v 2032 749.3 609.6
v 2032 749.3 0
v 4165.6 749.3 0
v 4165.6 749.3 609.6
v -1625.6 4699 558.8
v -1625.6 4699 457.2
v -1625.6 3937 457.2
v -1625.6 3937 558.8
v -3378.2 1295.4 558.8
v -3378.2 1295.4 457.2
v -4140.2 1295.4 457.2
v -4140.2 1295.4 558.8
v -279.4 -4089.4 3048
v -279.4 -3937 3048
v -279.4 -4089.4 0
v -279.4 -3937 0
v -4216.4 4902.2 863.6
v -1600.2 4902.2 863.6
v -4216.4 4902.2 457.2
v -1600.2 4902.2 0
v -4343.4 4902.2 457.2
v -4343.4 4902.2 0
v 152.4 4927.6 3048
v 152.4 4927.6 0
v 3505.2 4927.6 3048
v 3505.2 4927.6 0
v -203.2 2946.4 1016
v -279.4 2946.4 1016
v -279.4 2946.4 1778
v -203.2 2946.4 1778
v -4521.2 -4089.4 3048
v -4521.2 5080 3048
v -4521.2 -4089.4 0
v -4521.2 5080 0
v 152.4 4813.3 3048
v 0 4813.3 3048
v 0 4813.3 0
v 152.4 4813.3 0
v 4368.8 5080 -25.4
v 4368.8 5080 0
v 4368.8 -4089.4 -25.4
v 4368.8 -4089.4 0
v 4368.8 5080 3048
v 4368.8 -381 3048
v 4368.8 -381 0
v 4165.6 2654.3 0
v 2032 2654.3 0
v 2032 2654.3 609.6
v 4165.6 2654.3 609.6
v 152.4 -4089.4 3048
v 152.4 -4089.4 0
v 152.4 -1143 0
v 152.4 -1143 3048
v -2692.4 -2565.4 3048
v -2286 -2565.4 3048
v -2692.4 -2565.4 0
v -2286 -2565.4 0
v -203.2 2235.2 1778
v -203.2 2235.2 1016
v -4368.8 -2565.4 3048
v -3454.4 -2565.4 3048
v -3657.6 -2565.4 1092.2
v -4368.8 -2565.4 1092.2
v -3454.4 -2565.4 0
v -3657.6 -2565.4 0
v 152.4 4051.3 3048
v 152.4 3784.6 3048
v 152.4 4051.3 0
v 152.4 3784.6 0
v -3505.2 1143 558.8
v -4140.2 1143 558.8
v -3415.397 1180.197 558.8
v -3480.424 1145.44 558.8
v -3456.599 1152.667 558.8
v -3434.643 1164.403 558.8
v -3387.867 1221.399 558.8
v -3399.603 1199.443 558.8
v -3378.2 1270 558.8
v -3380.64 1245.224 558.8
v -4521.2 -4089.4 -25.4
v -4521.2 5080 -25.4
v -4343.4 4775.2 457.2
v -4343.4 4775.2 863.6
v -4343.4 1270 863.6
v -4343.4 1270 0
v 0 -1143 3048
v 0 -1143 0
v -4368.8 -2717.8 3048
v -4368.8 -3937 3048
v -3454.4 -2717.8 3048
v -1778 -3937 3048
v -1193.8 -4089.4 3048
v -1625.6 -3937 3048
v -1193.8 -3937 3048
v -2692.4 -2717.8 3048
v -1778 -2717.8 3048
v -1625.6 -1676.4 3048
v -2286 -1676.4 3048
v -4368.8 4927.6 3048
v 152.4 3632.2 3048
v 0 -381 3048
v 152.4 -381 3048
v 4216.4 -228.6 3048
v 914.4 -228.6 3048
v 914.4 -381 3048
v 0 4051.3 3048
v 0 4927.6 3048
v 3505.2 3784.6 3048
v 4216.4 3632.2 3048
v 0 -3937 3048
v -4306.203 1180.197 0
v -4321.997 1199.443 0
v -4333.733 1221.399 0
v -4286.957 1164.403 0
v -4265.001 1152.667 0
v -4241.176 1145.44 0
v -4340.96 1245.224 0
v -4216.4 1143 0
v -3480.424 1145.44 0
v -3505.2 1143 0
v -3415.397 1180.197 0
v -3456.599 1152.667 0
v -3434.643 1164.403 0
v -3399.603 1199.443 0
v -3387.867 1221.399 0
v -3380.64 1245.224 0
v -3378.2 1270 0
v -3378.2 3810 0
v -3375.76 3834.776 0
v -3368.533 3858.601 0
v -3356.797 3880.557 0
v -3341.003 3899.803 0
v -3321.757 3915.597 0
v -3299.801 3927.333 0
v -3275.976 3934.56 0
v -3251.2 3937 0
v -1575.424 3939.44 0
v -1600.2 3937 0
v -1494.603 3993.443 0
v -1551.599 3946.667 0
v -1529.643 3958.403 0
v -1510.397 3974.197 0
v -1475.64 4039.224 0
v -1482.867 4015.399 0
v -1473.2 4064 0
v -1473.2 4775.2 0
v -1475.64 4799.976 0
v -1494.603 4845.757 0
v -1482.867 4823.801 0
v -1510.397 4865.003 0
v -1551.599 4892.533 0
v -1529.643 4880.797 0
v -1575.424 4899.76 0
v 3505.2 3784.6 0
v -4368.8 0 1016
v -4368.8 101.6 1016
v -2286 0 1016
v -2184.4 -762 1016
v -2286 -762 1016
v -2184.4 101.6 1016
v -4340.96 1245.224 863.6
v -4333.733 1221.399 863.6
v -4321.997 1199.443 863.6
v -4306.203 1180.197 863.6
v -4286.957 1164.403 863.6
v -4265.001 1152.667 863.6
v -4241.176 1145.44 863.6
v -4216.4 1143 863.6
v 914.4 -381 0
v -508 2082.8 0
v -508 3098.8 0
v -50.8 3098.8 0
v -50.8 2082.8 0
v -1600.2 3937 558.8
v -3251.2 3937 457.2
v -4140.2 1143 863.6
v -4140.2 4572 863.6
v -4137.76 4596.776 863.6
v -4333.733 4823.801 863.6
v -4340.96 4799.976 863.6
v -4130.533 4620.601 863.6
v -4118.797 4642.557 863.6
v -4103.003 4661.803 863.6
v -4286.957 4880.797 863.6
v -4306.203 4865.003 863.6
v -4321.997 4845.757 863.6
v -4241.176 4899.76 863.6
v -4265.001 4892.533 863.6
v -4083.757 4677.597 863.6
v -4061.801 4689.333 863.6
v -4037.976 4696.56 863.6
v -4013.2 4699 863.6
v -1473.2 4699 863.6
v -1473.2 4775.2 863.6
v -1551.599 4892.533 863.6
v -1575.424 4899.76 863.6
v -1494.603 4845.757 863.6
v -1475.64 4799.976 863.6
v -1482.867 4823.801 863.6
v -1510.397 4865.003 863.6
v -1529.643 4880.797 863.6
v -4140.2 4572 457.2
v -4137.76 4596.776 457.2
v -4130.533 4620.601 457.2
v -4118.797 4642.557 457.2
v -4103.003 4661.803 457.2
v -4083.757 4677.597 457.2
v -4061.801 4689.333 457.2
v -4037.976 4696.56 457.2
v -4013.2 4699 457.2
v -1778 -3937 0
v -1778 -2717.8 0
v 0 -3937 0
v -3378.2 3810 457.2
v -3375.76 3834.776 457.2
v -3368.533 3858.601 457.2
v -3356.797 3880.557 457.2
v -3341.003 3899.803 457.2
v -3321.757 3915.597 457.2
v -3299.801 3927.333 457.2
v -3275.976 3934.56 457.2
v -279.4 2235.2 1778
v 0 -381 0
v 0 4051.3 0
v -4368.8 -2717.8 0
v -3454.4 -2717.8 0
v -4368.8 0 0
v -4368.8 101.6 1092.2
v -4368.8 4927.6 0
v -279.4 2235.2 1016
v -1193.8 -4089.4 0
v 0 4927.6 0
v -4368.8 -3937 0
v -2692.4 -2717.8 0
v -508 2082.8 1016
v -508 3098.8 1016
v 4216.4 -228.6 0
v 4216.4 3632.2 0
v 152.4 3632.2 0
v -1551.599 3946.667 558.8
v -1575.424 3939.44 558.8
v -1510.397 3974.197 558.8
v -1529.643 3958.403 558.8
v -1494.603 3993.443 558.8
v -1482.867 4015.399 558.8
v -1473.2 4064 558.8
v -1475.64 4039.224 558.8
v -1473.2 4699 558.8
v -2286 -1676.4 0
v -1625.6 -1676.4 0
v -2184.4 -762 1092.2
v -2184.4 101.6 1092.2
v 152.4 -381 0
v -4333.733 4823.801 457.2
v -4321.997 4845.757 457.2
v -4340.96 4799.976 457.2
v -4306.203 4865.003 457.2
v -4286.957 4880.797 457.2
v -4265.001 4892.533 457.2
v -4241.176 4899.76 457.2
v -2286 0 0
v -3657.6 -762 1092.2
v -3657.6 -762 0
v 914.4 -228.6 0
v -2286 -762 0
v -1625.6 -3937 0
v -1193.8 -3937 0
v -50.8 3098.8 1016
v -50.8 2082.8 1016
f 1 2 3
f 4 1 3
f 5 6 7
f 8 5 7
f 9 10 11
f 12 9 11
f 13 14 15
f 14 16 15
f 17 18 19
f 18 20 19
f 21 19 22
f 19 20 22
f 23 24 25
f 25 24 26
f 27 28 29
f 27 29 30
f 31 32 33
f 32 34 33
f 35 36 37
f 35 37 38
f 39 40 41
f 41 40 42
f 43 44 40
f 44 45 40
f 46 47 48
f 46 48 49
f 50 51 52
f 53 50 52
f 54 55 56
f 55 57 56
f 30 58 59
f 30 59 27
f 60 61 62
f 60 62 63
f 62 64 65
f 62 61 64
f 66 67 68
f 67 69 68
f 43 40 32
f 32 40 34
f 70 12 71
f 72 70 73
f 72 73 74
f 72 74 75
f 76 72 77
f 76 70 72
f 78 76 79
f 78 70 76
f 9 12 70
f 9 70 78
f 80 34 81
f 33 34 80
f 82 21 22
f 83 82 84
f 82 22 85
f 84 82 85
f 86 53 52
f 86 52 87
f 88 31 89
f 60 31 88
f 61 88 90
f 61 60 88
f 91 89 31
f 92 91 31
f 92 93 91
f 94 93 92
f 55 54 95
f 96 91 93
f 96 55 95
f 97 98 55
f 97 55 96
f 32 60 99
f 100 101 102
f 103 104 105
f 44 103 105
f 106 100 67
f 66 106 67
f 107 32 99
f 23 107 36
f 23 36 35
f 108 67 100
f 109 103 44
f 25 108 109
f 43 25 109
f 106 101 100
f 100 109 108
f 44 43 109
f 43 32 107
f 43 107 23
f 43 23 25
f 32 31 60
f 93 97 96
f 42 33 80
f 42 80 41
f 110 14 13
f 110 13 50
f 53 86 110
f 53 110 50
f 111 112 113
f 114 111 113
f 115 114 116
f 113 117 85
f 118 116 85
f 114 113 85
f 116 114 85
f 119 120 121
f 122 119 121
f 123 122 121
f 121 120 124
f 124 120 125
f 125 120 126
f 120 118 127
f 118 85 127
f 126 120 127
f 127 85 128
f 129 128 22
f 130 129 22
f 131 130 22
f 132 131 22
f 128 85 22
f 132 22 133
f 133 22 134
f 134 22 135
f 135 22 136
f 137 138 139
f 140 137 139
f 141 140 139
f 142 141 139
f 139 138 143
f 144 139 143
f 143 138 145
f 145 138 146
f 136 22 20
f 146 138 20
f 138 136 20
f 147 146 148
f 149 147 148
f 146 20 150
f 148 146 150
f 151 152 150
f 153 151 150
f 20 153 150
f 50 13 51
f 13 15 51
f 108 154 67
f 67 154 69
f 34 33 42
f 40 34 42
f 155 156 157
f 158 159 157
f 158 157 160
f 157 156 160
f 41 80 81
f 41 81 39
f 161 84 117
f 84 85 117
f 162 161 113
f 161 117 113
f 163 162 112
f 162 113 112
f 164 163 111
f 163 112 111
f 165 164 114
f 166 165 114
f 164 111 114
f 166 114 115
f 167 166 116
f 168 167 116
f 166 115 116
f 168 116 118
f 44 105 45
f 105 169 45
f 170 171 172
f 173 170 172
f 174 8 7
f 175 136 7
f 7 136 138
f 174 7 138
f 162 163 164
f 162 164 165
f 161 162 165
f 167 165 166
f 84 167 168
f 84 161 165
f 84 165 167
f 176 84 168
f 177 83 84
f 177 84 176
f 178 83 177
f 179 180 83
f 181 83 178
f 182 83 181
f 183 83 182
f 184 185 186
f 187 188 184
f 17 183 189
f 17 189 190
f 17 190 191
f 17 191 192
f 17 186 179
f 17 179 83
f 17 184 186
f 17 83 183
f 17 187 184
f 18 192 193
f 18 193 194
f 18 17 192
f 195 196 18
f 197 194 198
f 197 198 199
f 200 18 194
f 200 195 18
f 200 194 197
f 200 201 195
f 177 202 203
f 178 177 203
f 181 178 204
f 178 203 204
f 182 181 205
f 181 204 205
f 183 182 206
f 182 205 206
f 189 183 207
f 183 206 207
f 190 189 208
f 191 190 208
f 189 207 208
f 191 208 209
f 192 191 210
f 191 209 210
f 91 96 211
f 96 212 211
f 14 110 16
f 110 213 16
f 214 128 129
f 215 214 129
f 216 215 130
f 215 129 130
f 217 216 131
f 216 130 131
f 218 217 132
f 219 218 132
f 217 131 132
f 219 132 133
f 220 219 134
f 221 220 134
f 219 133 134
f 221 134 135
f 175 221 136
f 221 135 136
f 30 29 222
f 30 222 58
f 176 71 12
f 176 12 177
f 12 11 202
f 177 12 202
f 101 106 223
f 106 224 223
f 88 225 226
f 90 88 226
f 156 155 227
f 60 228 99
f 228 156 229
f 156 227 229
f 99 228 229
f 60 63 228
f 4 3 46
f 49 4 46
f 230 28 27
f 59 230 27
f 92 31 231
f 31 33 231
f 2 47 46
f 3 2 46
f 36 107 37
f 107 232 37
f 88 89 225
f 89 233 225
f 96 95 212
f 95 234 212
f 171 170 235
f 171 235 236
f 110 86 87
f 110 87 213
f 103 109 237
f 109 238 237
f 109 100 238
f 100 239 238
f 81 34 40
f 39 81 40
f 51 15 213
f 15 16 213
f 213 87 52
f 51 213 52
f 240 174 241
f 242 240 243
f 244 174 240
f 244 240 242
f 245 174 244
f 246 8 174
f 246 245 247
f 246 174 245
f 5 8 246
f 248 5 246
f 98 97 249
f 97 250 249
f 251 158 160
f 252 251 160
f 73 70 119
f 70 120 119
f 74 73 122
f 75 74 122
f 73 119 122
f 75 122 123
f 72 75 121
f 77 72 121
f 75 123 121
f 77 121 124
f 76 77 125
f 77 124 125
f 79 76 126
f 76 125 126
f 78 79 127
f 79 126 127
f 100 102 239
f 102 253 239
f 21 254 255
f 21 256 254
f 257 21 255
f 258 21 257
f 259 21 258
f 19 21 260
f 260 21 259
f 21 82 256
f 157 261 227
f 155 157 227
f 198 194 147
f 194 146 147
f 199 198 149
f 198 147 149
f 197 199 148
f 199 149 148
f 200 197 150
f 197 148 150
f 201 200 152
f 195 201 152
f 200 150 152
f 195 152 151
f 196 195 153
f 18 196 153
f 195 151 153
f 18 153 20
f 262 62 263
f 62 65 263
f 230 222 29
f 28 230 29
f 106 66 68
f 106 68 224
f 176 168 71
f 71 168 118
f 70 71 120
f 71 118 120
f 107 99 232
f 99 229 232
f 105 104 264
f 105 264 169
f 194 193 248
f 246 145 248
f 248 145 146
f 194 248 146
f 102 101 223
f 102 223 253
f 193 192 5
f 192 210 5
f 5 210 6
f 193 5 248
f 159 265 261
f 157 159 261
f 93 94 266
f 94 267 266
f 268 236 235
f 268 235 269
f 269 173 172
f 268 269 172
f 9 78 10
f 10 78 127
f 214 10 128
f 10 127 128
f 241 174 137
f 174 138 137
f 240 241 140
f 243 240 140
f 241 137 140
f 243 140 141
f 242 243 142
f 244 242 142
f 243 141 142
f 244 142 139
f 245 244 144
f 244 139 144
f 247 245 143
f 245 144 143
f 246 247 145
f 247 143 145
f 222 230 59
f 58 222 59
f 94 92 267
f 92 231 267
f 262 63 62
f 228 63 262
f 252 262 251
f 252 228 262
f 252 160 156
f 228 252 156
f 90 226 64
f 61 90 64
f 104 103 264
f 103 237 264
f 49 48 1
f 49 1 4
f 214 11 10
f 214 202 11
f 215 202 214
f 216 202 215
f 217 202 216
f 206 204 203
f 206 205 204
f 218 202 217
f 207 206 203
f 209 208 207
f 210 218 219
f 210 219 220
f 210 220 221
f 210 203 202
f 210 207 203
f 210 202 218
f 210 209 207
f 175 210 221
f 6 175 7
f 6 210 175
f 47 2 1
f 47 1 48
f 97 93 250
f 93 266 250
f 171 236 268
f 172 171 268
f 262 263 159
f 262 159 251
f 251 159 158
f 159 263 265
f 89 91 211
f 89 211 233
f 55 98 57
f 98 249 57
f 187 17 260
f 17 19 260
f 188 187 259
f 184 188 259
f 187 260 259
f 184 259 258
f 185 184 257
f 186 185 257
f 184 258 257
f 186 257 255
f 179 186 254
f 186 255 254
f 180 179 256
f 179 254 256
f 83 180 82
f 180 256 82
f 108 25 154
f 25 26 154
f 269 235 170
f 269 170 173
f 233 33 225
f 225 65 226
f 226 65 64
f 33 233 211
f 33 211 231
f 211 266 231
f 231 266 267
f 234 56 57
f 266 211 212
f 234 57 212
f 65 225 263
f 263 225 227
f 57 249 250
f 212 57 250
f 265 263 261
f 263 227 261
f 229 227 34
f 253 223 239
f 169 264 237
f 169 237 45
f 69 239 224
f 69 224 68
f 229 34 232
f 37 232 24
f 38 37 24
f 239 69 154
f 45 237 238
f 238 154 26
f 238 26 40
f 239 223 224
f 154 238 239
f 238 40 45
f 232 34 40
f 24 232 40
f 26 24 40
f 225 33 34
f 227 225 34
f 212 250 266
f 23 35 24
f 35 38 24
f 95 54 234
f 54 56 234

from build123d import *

# Parameters (mm, degrees)
F1_DEPTH  = 1016
F3_DEPTH  = 76.2
F5_DEPTH  = 1955.8
F6_W      = 8890
F6_H      = 9169.4
F7_DEPTH  = 25.4
F9_DEPTH  = 457.2
F11_DEPTH = 101.6
F13_DEPTH = 304.8
F14_W     = 457.2
F14_H     = 1016
F15_DEPTH = 1016
F16_W     = 76.2
F16_H     = 711.2
F17_DEPTH = 762
F18_W     = 2133.6
F18_H     = 1905
F19_DEPTH = 609.6


with BuildPart() as f1:
    # F0 (on Top) → F1 (new body)
    with BuildSketch(Plane.XY):
        Polygon((-4368.8, 152.4), (-4368.8, 4927.6), (0, 4927.6), (0, 4813.3), (152.4, 4813.3), (152.4, 4927.6), (3505.2, 4927.6), (3505.2, 3784.6), (152.4, 3784.6), (152.4, 4051.3), (0, 4051.3), (0, 0), (0, -381), (152.4, -381), (152.4, 0), (152.4, 3632.2), (4216.4, 3632.2), (4216.4, -228.6), (914.4, -228.6), (914.4, -381), (4216.4, -381), (4368.8, -381), (4368.8, 3632.2), (4368.8, 3784.6), (4368.8, 5080), (3505.2, 5080), (152.4, 5080), (-4521.2, 5080), (-4521.2, 0), (-4521.2, -6.74503), (-4521.2, -1866.195499), (-4521.2, -4089.4), (-4368.8, -4089.4), (-1625.6, -4089.4), (-1193.8, -4089.4), (-1193.8, -3937), (-1625.6, -3937), (-1625.6, -2565.4), (-1625.6, -1676.4), (-2286, -1676.4), (-2286, -2565.4), (-2692.4, -2565.4), (-2692.4, -2717.8), (-1778, -2717.8), (-1778, -3937), (-4368.8, -3937), (-4368.8, -2717.8), (-3454.4, -2717.8), (-3454.4, -2565.4), (-3657.6, -2565.4), (-4368.8, -2565.4), (-4368.8, -762), (-4368.8, 0), align=None)
        Polygon((-3657.6, 0), (-4368.8, 0), (-4368.8, -762), (-4368.8, -2565.4), (-3657.6, -2565.4), (-3657.6, -762), (-2286, -762), (-2286, 0), (-2311.890112, 0), align=None)
        Polygon((-279.4, -4089.4), (152.4, -4089.4), (152.4, -3937), (152.4, -1143), (0, -1143), (0, -3937), (-279.4, -3937), align=None)
    extrude(amount=F1_DEPTH)

    # F2 (on face) → F3 (join)
    with BuildSketch(Plane.XY.offset(1016)):
        Polygon((-2286, -762), (-2286, 0), (-4368.8, 0), (-4368.8, 101.6), (-4368.8, 4927.6), (0, 4927.6), (0, 4813.3), (152.4, 4813.3), (152.4, 4927.6), (3505.2, 4927.6), (3505.2, 3784.6), (152.4, 3784.6), (152.4, 4051.3), (0, 4051.3), (0, -381), (152.4, -381), (152.4, 3632.2), (4216.4, 3632.2), (4216.4, -228.6), (914.4, -228.6), (914.4, -381), (4368.8, -381), (4368.8, 5080), (-4521.2, 5080), (-4521.2, -4089.4), (-1193.8, -4089.4), (-1193.8, -3937), (-1625.6, -3937), (-1625.6, -1676.4), (-2286, -1676.4), (-2286, -2565.4), (-2692.4, -2565.4), (-2692.4, -2717.8), (-1778, -2717.8), (-1778, -3937), (-4368.8, -3937), (-4368.8, -2717.8), (-3454.4, -2717.8), (-3454.4, -2565.4), (-3657.6, -2565.4), (-3657.6, -762), align=None)
        Polygon((0, -1143), (0, -3937), (-279.4, -3937), (-279.4, -4089.4), (152.4, -4089.4), (152.4, -1143), align=None)
        Polygon((-4368.8, 0), (-2286, 0), (-2286, -762), (-2184.4, -762), (-2184.4, 101.6), (-2286, 101.6), (-4368.8, 101.6), align=None)
    extrude(amount=F3_DEPTH)

    # F4 (on face) → F5 (join)
    with BuildSketch(Plane.XY.offset(1092.2)):
        Polygon((0, -1143), (0, -3937), (-279.4, -3937), (-279.4, -4089.4), (152.4, -4089.4), (152.4, -1143), align=None)
        Polygon((-3454.4, -2565.4), (-3657.6, -2565.4), (-4368.8, -2565.4), (-4368.8, 101.6), (-4368.8, 4927.6), (0, 4927.6), (0, 4813.3), (152.4, 4813.3), (152.4, 4927.6), (3505.2, 4927.6), (3505.2, 3784.6), (152.4, 3784.6), (152.4, 4051.3), (0, 4051.3), (0, -381), (152.4, -381), (152.4, 3632.2), (4216.4, 3632.2), (4216.4, -228.6), (914.4, -228.6), (914.4, -381), (4368.8, -381), (4368.8, 5080), (-4521.2, 5080), (-4521.2, -4089.4), (-1193.8, -4089.4), (-1193.8, -3937), (-1625.6, -3937), (-1625.6, -1676.4), (-2286, -1676.4), (-2286, -2565.4), (-2692.4, -2565.4), (-2692.4, -2717.8), (-1778, -2717.8), (-1778, -3937), (-4368.8, -3937), (-4368.8, -2717.8), (-3454.4, -2717.8), align=None)
    extrude(amount=F5_DEPTH)


with BuildPart() as f7:
    # F6 (on face) → F7 (new body)
    with BuildSketch(Plane(origin=(0, 0, 0), x_dir=(1, 0, 0), z_dir=(0, 0, -1))):
        with Locations((-76.2, -495.3)):
            Rectangle(F6_W, F6_H)
    extrude(amount=F7_DEPTH)


with BuildPart() as f9:
    # F8 (on face) → F9 (new body)
    with BuildSketch(Plane.XY):
        with BuildLine():
            Line((-4216.4, 4902.2), (-4343.4, 4902.2))
            Line((-4343.4, 4902.2), (-4343.4, 4775.2))
            ThreePointArc((-4343.4, 4775.2), (-4306.202561, 4865.002561), (-4216.4, 4902.2))
        make_face()
        with BuildLine():
            Line((-3378.2, 4902.2), (-4216.4, 4902.2))
            ThreePointArc((-4216.4, 4902.2), (-4306.202561, 4865.002561), (-4343.4, 4775.2))
            Line((-4343.4, 4775.2), (-4343.4, 3937))
            Line((-4343.4, 3937), (-4343.4, 1270))
            ThreePointArc((-4343.4, 1270), (-4306.202561, 1180.197439), (-4216.4, 1143))
            Line((-4216.4, 1143), (-3505.2, 1143))
            ThreePointArc((-3505.2, 1143), (-3415.397439, 1180.197439), (-3378.2, 1270))
            Line((-3378.2, 1270), (-3378.2, 3810))
            ThreePointArc((-3378.2, 3810), (-3341.002561, 3899.802561), (-3251.2, 3937))
            Line((-3251.2, 3937), (-1600.2, 3937))
            ThreePointArc((-1600.2, 3937), (-1510.397439, 3974.197439), (-1473.2, 4064))
            Line((-1473.2, 4064), (-1473.2, 4775.2))
            ThreePointArc((-1473.2, 4775.2), (-1510.397439, 4865.002561), (-1600.2, 4902.2))
            Line((-1600.2, 4902.2), (-3378.2, 4902.2))
        make_face()
    extrude(amount=F9_DEPTH)

    # F10 (on face) → F11 (join)
    with BuildSketch(Plane.XY.offset(457.2)):
        with BuildLine():
            Line((-1600.2, 4902.2), (-4216.4, 4902.2))
            ThreePointArc((-4216.4, 4902.2), (-4306.202561, 4865.002561), (-4343.4, 4775.2))
            Line((-4343.4, 4775.2), (-4343.4, 1270))
            ThreePointArc((-4343.4, 1270), (-4306.202561, 1180.197439), (-4216.4, 1143))
            Line((-4216.4, 1143), (-3505.2, 1143))
            ThreePointArc((-3505.2, 1143), (-3415.397439, 1180.197439), (-3378.2, 1270))
            Line((-3378.2, 1270), (-3378.2, 1295.4))
            Line((-3378.2, 1295.4), (-4140.2, 1295.4))
            Line((-4140.2, 1295.4), (-4140.2, 4572))
            ThreePointArc((-4140.2, 4572), (-4103.002561, 4661.802561), (-4013.2, 4699))
            Line((-4013.2, 4699), (-1625.6, 4699))
            Line((-1625.6, 4699), (-1625.6, 3937))
            Line((-1625.6, 3937), (-1600.2, 3937))
            ThreePointArc((-1600.2, 3937), (-1510.397439, 3974.197439), (-1473.2, 4064))
            Line((-1473.2, 4064), (-1473.2, 4775.2))
            ThreePointArc((-1473.2, 4775.2), (-1510.397439, 4865.002561), (-1600.2, 4902.2))
        make_face()
    extrude(amount=F11_DEPTH)

    # F12 (on face) → F13 (join)
    with BuildSketch(Plane.XY.offset(558.8)):
        with BuildLine():
            ThreePointArc((-4140.2, 4572), (-4103.002561, 4661.802561), (-4013.2, 4699))
            Line((-4013.2, 4699), (-1625.6, 4699))
            Line((-1625.6, 4699), (-1473.2, 4699))
            Line((-1473.2, 4699), (-1473.2, 4775.2))
            ThreePointArc((-1473.2, 4775.2), (-1510.397439, 4865.002561), (-1600.2, 4902.2))
            Line((-1600.2, 4902.2), (-4216.4, 4902.2))
            ThreePointArc((-4216.4, 4902.2), (-4306.202561, 4865.002561), (-4343.4, 4775.2))
            Line((-4343.4, 4775.2), (-4343.4, 1270))
            ThreePointArc((-4343.4, 1270), (-4306.202561, 1180.197439), (-4216.4, 1143))
            Line((-4216.4, 1143), (-4140.2, 1143))
            Line((-4140.2, 1143), (-4140.2, 1295.4))
            Line((-4140.2, 1295.4), (-4140.2, 4572))
        make_face()
    extrude(amount=F13_DEPTH)


with BuildPart() as f15:
    # F14 (on face) → F15 (new body)
    with BuildSketch(Plane.XY):
        with Locations((-279.4, 2590.8)):
            Rectangle(F14_W, F14_H)
    extrude(amount=F15_DEPTH)


with BuildPart() as f17:
    # F16 (on face) → F17 (new body)
    with BuildSketch(Plane.XY.offset(1016)):
        with Locations((-241.3, 2590.8)):
            Rectangle(F16_W, F16_H)
    extrude(amount=F17_DEPTH)


with BuildPart() as f19:
    # F18 (on face) → F19 (new body)
    with BuildSketch(Plane.XY):
        with Locations((3098.8, 1701.8)):
            Rectangle(F18_W, F18_H)
    extrude(amount=F19_DEPTH)


solid = Compound([f1.part, f7.part, f9.part, f15.part, f17.part, f19.part])
